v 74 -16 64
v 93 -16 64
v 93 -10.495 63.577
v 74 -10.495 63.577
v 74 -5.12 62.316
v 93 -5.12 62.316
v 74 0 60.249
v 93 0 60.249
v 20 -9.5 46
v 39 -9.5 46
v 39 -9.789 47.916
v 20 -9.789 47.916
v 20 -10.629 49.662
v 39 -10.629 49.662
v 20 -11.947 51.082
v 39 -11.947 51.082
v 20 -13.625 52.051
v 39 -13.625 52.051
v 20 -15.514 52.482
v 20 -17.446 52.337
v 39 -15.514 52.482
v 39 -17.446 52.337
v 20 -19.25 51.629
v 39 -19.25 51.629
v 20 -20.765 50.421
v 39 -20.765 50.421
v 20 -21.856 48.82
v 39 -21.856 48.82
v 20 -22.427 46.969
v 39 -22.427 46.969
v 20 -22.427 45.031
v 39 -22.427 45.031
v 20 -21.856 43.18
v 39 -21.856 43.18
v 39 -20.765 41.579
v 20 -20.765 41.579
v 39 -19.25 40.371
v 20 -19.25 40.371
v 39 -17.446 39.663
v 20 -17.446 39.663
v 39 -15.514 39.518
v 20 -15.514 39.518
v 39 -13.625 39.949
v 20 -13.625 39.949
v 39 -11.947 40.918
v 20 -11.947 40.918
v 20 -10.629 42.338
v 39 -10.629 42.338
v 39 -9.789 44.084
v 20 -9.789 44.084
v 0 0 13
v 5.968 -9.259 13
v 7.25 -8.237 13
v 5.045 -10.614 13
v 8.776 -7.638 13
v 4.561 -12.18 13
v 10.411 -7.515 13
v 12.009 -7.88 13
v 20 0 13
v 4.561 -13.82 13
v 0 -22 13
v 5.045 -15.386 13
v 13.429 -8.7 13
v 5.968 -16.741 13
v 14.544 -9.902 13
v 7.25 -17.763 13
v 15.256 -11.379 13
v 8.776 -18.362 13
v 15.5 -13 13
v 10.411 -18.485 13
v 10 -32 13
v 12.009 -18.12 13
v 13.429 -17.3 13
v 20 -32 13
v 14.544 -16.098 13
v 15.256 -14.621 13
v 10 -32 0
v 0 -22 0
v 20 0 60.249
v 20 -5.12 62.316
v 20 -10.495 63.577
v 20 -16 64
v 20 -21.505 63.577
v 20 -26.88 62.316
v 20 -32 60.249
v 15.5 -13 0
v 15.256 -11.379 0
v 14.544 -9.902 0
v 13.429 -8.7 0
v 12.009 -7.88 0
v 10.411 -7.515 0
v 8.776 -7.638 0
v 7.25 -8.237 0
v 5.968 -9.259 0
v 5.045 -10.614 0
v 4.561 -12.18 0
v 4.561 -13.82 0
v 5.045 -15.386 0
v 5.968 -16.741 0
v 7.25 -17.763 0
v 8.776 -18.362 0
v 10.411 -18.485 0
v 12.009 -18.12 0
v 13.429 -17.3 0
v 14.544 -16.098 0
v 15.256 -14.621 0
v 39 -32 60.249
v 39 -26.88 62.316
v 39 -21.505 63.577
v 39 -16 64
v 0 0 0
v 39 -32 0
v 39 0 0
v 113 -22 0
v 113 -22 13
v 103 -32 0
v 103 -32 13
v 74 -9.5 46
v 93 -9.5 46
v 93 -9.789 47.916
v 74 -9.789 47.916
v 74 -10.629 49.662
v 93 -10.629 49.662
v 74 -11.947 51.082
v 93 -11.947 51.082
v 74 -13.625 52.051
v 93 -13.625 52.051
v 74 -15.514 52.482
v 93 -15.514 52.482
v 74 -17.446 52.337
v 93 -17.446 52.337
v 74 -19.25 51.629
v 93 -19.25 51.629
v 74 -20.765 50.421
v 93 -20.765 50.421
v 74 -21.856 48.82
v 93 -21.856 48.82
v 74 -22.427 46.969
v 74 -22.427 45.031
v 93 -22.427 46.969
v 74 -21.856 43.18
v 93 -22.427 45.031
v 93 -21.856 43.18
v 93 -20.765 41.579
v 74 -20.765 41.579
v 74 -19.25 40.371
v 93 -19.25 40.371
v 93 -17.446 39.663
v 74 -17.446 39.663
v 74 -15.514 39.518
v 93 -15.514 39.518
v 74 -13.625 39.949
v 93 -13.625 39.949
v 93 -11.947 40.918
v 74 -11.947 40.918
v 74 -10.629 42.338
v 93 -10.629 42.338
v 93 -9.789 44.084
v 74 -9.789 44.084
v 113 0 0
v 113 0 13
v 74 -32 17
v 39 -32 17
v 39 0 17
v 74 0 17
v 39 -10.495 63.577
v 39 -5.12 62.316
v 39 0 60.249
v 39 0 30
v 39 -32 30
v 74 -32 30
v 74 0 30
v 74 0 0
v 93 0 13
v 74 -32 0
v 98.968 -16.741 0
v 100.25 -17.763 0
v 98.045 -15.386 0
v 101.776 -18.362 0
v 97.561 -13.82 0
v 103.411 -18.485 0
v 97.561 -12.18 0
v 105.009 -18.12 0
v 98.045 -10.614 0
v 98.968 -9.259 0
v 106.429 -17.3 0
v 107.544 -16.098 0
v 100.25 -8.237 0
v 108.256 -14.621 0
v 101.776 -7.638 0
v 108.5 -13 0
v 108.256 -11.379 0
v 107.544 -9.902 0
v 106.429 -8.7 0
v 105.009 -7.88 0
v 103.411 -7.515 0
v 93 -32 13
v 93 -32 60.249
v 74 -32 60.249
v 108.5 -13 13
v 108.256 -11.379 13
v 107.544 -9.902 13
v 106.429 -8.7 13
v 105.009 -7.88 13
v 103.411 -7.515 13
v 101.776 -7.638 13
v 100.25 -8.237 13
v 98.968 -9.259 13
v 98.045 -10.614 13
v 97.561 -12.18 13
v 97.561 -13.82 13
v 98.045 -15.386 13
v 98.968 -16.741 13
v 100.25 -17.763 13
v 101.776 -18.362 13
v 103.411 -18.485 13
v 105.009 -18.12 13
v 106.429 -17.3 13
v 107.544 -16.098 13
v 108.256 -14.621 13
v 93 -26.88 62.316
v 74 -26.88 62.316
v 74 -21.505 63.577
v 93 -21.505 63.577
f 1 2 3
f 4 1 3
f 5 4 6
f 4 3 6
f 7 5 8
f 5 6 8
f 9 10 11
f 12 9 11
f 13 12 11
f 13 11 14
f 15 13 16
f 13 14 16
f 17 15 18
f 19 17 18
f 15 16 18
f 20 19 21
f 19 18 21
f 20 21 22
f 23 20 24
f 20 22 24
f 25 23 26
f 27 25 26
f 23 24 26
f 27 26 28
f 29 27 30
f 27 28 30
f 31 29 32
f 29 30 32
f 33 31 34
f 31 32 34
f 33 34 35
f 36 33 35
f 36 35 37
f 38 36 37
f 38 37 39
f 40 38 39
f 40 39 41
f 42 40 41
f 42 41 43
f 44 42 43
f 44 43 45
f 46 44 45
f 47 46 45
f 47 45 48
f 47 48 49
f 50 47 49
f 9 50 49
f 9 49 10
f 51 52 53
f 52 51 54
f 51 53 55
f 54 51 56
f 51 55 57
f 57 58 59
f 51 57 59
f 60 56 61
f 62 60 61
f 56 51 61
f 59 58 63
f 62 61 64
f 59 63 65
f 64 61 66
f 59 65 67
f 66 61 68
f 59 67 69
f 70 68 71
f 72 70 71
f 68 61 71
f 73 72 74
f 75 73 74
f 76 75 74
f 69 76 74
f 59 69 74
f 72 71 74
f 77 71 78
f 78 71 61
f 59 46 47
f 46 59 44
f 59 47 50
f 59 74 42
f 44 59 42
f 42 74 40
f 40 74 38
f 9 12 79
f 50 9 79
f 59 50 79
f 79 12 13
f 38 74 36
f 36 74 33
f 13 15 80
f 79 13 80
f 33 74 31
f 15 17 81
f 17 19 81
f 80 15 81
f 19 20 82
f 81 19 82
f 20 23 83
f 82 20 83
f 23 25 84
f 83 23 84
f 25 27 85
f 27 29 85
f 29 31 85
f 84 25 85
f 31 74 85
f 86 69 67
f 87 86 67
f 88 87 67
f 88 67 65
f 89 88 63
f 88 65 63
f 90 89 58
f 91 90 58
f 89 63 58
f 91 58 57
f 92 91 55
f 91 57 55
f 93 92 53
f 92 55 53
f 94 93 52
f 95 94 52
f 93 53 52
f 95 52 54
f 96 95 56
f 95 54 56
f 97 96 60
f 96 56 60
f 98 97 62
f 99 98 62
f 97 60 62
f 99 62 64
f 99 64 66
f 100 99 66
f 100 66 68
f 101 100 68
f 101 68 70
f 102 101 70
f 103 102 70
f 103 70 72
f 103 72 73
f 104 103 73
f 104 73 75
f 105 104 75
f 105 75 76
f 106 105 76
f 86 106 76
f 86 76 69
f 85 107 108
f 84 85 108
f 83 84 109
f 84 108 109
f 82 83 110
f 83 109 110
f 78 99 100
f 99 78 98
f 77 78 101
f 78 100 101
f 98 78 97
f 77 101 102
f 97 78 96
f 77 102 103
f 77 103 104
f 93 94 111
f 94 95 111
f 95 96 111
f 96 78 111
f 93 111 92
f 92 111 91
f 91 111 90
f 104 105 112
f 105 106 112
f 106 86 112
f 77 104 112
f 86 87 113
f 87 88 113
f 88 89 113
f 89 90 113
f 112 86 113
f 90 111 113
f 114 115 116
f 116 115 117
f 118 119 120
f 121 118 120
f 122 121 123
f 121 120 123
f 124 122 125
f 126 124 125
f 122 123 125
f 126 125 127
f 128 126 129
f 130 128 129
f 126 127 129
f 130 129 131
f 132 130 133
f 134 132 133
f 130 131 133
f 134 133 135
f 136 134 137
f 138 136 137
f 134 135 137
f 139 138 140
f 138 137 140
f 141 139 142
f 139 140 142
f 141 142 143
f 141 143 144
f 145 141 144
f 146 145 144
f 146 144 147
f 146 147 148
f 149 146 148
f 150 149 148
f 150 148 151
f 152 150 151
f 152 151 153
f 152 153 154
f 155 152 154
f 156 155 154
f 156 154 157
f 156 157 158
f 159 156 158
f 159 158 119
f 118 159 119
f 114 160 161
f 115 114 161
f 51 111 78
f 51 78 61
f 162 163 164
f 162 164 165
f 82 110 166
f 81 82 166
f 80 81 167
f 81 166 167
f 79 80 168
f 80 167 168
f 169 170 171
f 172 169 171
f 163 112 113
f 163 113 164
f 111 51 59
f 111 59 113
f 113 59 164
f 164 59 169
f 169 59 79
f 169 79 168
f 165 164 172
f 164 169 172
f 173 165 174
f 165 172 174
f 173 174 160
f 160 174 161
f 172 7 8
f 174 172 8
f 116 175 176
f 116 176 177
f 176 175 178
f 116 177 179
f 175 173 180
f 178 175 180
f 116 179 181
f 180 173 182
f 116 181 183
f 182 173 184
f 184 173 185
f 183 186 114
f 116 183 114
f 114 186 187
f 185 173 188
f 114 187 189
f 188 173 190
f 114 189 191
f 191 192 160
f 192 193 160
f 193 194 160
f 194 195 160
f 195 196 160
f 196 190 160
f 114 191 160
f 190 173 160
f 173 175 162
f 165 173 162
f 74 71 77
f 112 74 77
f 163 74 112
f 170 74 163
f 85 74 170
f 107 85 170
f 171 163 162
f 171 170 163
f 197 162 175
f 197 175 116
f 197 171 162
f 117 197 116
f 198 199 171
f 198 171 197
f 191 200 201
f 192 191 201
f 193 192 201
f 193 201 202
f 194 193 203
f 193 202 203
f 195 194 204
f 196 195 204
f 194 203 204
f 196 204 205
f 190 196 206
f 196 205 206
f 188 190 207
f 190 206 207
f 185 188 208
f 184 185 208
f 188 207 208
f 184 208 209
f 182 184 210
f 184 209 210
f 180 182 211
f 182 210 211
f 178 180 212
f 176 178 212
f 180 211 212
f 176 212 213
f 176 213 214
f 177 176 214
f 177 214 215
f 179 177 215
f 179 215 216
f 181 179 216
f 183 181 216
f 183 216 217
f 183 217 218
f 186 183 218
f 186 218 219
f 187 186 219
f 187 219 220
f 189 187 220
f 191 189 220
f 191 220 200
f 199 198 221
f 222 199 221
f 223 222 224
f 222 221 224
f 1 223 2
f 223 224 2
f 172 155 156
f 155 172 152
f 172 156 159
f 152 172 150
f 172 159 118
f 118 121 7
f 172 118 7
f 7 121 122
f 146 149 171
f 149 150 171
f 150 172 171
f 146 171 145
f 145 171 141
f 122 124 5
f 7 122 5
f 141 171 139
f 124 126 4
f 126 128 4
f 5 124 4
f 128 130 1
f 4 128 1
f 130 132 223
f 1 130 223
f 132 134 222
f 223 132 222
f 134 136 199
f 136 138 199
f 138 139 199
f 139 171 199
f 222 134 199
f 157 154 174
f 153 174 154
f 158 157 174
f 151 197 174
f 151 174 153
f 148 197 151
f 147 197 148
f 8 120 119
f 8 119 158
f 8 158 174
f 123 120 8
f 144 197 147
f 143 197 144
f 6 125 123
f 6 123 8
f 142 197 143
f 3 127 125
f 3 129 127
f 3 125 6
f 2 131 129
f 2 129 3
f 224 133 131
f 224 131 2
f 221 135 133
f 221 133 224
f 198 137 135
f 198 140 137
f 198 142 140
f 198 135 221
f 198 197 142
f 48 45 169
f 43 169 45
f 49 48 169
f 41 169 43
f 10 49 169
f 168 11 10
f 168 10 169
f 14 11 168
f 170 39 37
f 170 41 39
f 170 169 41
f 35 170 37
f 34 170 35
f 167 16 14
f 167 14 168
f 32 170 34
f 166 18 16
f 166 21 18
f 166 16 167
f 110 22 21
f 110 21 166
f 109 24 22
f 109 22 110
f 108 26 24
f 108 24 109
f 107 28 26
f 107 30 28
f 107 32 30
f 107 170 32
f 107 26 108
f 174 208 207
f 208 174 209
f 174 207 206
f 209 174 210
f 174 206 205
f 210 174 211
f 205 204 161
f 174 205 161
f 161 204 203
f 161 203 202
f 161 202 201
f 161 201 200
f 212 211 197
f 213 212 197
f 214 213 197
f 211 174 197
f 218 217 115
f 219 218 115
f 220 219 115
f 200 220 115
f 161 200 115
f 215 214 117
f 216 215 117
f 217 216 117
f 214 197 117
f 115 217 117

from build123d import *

# Parameters (mm, degrees)
F0_W      = 113
F0_H      = 64
F1_DEPTH  = 32
F2_W      = 20
F2_H      = 51
F2_W_2    = 35
F2_H_2    = 34
F2_H_3    = 17
F3_DEPTH  = 32.001
F5_DEPTH  = 25
F7_DEPTH  = 93.001
F8_R      = 6.5
F9_DEPTH  = 93.001
F11_R     = 5.5
F10_R     = 5.5
F12_DEPTH = 13.001


with BuildPart() as f1:
    # F0 (on Front) → F1 (new body)
    with BuildSketch(Plane.XZ):
        with Locations((56.5, 32)):
            Rectangle(F0_W, F0_H)
    extrude(amount=F1_DEPTH)

    # F2 (on face) → F3 (cut, through all)
    with BuildSketch(Plane.XZ.offset(32)):
        with Locations((10, 38.5)):
            Rectangle(F2_W, F2_H)
        with Locations((56.5, 47)):
            Rectangle(F2_W_2, F2_H_2)
        with Locations((56.5, 8.5)):
            Rectangle(F2_W_2, F2_H_3)
        with Locations((103, 38.5)):
            Rectangle(F2_W, F2_H)
    extrude(amount=-F3_DEPTH, mode=Mode.SUBTRACT)

    # F4 (on face) → F5 (cut)
    with BuildSketch(Plane.XY.offset(13)):
        Polygon((103, -32), (113, -32), (113, -22), align=None)
        Polygon((0, -22), (0, -32), (10, -32), align=None)
    extrude(amount=-F5_DEPTH, mode=Mode.SUBTRACT)

    # F6 (on face) → F7 (cut, through all)
    with BuildSketch(Plane.YZ.offset(93)):
        with BuildLine():
            ThreePointArc((-32, 60.2490309932), (-24.2168997878, 63.0497155178), (-16, 64))
            Line((-16, 64), (-32, 64))
            Line((-32, 64), (-32, 60.2490309932))
        make_face()
        with BuildLine():
            ThreePointArc((-16, 64), (-7.7831002122, 63.0497155178), (0, 60.2490309932))
            Line((0, 60.2490309932), (0, 64))
            Line((0, 64), (-16, 64))
        make_face()
    extrude(amount=-F7_DEPTH, mode=Mode.SUBTRACT)

    # F8 (on face) → F9 (cut, through all)
    with BuildSketch(Plane.YZ.offset(93)):
        with Locations((-16, 46)):
            Circle(F8_R)
    extrude(amount=-F9_DEPTH, mode=Mode.SUBTRACT)

    # F11 (on face) + F10 (on face) → F12 (cut, through all)
    with BuildSketch(Plane.XY.offset(13)):
        with Locations((103, -13)):
            Circle(F11_R)
    with BuildSketch(Plane.XY.offset(13)):
        with Locations((10, -13)):
            Circle(F10_R)
    extrude(amount=-F12_DEPTH, mode=Mode.SUBTRACT)


solid = f1.part
